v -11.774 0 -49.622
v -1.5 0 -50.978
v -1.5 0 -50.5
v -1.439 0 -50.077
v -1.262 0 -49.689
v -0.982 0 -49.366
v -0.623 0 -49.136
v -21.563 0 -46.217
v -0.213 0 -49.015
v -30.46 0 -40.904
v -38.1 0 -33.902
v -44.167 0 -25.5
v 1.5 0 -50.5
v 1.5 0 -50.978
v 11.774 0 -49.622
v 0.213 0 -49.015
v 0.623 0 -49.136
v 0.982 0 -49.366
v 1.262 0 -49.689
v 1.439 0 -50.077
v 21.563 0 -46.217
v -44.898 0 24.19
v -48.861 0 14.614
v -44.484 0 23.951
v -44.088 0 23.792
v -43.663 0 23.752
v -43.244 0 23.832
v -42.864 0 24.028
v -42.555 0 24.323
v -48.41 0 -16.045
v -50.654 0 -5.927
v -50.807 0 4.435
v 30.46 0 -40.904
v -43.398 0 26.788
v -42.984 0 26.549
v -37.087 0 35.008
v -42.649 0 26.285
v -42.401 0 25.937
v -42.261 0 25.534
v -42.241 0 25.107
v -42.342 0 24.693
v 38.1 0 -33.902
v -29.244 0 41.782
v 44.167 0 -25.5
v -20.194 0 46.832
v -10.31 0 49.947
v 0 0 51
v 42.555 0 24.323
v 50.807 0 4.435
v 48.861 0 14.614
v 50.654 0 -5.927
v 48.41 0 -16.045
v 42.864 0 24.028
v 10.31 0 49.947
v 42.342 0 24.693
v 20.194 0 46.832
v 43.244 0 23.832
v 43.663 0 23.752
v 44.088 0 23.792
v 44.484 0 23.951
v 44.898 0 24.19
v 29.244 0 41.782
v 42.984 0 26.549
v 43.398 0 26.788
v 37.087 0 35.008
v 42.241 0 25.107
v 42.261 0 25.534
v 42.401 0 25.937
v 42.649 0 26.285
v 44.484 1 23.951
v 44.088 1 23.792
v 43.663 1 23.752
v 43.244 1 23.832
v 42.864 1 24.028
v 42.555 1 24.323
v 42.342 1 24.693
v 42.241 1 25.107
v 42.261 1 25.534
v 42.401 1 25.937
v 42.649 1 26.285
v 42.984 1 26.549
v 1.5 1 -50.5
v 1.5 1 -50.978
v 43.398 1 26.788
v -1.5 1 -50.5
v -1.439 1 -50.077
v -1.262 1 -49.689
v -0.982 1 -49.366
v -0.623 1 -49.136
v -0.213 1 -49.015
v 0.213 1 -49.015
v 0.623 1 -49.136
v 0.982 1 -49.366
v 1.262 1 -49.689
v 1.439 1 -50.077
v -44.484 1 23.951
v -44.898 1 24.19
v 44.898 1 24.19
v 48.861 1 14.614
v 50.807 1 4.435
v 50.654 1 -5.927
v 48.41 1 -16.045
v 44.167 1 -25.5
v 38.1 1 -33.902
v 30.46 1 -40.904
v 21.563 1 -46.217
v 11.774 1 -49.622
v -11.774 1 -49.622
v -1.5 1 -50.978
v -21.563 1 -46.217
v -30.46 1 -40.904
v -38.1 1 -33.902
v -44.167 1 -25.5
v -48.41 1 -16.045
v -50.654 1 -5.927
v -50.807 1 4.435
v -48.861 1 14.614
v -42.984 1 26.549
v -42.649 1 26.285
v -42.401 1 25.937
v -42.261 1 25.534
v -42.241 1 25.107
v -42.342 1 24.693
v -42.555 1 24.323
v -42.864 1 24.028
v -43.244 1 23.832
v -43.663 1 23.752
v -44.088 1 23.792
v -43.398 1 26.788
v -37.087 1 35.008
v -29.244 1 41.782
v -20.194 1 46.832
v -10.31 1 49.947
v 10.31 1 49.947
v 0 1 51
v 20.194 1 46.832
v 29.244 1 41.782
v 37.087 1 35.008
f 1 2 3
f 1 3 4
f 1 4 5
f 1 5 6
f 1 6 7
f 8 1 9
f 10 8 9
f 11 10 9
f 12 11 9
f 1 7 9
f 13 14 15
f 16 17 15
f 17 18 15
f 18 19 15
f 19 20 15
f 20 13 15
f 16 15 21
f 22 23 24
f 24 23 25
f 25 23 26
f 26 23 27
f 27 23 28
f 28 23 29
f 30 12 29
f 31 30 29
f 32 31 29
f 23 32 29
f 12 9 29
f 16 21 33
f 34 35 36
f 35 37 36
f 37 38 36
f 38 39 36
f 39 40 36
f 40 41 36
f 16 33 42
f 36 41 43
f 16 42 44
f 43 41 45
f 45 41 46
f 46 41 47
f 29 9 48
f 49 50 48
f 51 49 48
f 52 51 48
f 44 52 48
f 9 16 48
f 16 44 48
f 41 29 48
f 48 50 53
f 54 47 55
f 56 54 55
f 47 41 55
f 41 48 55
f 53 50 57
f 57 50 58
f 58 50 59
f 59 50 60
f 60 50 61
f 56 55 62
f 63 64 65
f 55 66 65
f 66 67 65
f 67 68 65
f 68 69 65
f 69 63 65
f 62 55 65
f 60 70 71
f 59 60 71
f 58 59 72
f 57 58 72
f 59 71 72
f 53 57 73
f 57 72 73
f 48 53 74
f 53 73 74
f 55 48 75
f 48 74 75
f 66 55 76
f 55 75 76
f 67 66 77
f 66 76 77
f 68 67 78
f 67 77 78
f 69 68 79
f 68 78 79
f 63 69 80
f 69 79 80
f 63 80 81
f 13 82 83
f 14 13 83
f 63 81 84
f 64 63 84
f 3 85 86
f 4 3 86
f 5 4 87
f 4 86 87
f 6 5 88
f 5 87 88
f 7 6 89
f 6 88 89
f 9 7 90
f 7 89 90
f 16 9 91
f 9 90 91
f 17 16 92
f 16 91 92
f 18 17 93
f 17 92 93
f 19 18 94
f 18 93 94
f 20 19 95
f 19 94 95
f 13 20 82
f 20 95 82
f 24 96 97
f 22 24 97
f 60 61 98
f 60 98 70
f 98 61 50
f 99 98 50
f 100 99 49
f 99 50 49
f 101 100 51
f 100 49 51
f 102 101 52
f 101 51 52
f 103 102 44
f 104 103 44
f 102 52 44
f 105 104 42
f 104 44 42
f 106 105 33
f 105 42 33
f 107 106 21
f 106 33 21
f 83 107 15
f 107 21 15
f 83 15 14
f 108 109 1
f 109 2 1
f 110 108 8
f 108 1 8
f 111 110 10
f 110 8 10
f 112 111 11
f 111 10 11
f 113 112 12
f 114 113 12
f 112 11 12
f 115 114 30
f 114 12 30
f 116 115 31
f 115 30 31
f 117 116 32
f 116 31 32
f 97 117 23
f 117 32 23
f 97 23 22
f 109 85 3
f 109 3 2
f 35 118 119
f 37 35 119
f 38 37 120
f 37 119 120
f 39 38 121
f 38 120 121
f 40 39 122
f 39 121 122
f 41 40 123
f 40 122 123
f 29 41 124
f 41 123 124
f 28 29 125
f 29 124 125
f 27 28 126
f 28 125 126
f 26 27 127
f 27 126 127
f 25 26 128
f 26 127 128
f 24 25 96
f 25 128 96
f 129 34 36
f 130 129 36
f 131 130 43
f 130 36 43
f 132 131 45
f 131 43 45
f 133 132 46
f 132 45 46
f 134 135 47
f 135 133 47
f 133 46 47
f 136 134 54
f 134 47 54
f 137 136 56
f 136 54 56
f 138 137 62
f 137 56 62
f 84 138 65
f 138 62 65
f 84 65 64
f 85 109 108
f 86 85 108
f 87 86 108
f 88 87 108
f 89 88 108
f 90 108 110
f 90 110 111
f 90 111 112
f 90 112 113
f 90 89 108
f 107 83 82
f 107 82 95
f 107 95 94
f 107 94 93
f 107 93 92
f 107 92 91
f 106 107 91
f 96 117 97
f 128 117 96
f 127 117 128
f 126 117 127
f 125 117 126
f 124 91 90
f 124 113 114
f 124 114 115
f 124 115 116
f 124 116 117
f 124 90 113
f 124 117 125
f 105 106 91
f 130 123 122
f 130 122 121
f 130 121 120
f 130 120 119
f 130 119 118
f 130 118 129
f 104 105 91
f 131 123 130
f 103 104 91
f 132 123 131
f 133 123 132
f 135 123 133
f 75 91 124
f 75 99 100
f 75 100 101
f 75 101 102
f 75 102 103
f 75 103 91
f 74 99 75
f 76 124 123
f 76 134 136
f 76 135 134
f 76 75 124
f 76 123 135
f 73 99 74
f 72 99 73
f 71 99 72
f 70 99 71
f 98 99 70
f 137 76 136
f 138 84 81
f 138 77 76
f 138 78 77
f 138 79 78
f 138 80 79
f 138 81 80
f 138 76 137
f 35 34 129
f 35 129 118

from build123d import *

# Parameters (mm, degrees)
SKETCH_1_R          = 51
EXTRUDE_1_DEPTH     = 1
SKETCH_2_R          = 1.5
CUT_EXTRUDE_1_DEPTH = 73.131823767
SKETCH_3_W          = 3
SKETCH_3_H          = 1
CUT_EXTRUDE_2_DEPTH = 73.131823767


with BuildPart() as part:
    # 草图1 → 凸台-拉伸1 (new body)
    with BuildSketch(Plane(origin=(0, 0, 0), x_dir=(1, 0, 0), z_dir=(0, 1, 0))):
        with Locations(Location((0, 0, 0), (0, 0, 270))):
            Circle(SKETCH_1_R)
    extrude(amount=EXTRUDE_1_DEPTH)

    # 草图2 → 切除-拉伸1 (cut, through all)
    with BuildSketch(Plane(origin=(0, 1, 0), x_dir=(1, 0, 0), z_dir=(0, 1, 0))):
        with Locations((0, 50.5)):
            Circle(SKETCH_2_R)
        with Locations((-43.734282891, -25.25)):
            Circle(SKETCH_2_R)
        with Locations((43.734282891, -25.25)):
            Circle(SKETCH_2_R)
    extrude(amount=-CUT_EXTRUDE_1_DEPTH, mode=Mode.SUBTRACT)

    # 草图3 → 切除-拉伸2 (cut, through all)
    with BuildSketch(Plane(origin=(0, 1, 0), x_dir=(1, 0, 0), z_dir=(0, 1, 0))):
        Polygon((-44.484282891, -23.950961894), (-45.350308295, -24.450961894), (-43.850308295, -27.049038106), (-42.984282891, -26.549038106), align=None)
        with Locations((0, 51)):
            Rectangle(SKETCH_3_W, SKETCH_3_H)
        Polygon((44.484282891, -23.950961894), (42.984282891, -26.549038106), (43.850308295, -27.049038106), (45.350308295, -24.450961894), align=None)
    extrude(amount=-CUT_EXTRUDE_2_DEPTH, mode=Mode.SUBTRACT)


solid = part.part
